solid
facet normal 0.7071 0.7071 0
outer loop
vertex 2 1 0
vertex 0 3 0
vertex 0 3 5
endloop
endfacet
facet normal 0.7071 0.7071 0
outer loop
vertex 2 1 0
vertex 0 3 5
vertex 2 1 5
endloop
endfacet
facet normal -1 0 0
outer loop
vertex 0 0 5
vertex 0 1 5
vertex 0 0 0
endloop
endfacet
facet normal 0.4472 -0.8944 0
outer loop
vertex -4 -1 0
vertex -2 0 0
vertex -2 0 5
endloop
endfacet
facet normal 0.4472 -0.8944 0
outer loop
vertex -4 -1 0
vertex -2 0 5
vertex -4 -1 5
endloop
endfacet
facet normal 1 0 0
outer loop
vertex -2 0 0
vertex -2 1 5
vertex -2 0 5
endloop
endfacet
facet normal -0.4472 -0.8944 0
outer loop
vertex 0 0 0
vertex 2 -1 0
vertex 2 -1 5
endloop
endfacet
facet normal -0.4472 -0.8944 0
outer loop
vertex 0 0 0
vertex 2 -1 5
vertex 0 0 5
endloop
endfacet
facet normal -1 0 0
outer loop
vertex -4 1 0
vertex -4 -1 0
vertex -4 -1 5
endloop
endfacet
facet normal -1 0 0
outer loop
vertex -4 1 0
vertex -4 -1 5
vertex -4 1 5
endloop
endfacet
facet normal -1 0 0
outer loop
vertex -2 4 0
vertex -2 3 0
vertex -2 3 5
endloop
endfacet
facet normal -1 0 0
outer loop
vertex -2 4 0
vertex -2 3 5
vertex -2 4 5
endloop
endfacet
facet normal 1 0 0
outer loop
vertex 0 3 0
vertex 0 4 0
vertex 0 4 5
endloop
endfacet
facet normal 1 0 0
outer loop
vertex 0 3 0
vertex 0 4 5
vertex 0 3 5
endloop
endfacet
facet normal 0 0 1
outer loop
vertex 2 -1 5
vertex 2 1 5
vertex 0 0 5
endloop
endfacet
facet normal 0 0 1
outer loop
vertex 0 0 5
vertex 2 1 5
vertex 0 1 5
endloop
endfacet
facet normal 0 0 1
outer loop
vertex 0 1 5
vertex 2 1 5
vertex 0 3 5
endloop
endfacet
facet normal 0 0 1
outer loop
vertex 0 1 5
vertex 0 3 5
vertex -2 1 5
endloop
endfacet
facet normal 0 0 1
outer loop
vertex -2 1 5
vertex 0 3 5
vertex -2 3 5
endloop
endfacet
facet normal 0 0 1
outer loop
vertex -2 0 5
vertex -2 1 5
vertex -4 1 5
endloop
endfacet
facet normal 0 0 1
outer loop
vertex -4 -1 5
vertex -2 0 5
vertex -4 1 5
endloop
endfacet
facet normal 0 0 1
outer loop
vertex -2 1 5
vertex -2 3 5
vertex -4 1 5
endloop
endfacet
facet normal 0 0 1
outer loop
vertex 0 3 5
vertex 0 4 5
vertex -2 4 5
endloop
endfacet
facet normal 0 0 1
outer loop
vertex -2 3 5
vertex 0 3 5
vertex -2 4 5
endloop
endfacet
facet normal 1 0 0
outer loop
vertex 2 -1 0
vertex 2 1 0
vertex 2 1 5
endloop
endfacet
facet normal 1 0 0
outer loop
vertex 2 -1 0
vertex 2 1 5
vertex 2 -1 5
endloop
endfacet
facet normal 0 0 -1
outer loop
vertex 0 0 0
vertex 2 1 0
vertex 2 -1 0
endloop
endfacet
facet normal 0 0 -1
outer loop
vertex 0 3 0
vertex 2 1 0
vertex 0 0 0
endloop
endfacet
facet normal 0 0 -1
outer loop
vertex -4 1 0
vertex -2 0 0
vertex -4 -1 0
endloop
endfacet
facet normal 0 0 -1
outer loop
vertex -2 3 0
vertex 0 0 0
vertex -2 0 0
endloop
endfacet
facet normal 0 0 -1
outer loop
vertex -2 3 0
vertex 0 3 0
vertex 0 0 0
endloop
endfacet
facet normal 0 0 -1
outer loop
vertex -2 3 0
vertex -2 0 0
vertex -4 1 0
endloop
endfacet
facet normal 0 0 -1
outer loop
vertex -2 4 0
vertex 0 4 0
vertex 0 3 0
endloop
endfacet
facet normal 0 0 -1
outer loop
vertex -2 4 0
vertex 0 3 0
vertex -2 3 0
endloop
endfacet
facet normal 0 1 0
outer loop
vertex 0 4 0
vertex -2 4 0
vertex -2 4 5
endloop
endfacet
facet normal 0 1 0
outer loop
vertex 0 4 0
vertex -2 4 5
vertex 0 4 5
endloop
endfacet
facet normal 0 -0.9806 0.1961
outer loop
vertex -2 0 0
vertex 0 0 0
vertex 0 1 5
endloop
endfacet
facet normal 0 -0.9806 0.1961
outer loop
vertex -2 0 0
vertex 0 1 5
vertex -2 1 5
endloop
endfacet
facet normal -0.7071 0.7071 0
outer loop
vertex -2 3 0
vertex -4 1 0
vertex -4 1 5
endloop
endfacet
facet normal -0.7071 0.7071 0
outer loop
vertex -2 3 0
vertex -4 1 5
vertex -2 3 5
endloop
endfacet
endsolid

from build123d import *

# Parameters (mm, degrees)
BOSS_EXTRUDE1_DEPTH = 5
SKETCH3_W           = 2
SKETCH3_H           = 5.099019514
CUT_EXTRUDE3_DEPTH  = 2


with BuildPart() as part:
    # Sketch1 → Boss-Extrude1 (new body)
    with BuildSketch(Plane.XY):
        Polygon((0, 0), (-2, 0), (-4, -1), (-4, 1), (-2, 3), (-2, 4), (0, 4), (0, 3), (2, 1), (2, -1), align=None)
    extrude(amount=BOSS_EXTRUDE1_DEPTH)

    # Sketch3 → Cut-Extrude3 (cut)
    with BuildSketch(Plane(origin=(0, 0, 0), x_dir=(-1, 0, 0), z_dir=(0, -0.980580676, 0.196116135))):
        with Locations((1, -2.549509757)):
            Rectangle(SKETCH3_W, SKETCH3_H)
    extrude(amount=CUT_EXTRUDE3_DEPTH, mode=Mode.SUBTRACT)


solid = part.part
